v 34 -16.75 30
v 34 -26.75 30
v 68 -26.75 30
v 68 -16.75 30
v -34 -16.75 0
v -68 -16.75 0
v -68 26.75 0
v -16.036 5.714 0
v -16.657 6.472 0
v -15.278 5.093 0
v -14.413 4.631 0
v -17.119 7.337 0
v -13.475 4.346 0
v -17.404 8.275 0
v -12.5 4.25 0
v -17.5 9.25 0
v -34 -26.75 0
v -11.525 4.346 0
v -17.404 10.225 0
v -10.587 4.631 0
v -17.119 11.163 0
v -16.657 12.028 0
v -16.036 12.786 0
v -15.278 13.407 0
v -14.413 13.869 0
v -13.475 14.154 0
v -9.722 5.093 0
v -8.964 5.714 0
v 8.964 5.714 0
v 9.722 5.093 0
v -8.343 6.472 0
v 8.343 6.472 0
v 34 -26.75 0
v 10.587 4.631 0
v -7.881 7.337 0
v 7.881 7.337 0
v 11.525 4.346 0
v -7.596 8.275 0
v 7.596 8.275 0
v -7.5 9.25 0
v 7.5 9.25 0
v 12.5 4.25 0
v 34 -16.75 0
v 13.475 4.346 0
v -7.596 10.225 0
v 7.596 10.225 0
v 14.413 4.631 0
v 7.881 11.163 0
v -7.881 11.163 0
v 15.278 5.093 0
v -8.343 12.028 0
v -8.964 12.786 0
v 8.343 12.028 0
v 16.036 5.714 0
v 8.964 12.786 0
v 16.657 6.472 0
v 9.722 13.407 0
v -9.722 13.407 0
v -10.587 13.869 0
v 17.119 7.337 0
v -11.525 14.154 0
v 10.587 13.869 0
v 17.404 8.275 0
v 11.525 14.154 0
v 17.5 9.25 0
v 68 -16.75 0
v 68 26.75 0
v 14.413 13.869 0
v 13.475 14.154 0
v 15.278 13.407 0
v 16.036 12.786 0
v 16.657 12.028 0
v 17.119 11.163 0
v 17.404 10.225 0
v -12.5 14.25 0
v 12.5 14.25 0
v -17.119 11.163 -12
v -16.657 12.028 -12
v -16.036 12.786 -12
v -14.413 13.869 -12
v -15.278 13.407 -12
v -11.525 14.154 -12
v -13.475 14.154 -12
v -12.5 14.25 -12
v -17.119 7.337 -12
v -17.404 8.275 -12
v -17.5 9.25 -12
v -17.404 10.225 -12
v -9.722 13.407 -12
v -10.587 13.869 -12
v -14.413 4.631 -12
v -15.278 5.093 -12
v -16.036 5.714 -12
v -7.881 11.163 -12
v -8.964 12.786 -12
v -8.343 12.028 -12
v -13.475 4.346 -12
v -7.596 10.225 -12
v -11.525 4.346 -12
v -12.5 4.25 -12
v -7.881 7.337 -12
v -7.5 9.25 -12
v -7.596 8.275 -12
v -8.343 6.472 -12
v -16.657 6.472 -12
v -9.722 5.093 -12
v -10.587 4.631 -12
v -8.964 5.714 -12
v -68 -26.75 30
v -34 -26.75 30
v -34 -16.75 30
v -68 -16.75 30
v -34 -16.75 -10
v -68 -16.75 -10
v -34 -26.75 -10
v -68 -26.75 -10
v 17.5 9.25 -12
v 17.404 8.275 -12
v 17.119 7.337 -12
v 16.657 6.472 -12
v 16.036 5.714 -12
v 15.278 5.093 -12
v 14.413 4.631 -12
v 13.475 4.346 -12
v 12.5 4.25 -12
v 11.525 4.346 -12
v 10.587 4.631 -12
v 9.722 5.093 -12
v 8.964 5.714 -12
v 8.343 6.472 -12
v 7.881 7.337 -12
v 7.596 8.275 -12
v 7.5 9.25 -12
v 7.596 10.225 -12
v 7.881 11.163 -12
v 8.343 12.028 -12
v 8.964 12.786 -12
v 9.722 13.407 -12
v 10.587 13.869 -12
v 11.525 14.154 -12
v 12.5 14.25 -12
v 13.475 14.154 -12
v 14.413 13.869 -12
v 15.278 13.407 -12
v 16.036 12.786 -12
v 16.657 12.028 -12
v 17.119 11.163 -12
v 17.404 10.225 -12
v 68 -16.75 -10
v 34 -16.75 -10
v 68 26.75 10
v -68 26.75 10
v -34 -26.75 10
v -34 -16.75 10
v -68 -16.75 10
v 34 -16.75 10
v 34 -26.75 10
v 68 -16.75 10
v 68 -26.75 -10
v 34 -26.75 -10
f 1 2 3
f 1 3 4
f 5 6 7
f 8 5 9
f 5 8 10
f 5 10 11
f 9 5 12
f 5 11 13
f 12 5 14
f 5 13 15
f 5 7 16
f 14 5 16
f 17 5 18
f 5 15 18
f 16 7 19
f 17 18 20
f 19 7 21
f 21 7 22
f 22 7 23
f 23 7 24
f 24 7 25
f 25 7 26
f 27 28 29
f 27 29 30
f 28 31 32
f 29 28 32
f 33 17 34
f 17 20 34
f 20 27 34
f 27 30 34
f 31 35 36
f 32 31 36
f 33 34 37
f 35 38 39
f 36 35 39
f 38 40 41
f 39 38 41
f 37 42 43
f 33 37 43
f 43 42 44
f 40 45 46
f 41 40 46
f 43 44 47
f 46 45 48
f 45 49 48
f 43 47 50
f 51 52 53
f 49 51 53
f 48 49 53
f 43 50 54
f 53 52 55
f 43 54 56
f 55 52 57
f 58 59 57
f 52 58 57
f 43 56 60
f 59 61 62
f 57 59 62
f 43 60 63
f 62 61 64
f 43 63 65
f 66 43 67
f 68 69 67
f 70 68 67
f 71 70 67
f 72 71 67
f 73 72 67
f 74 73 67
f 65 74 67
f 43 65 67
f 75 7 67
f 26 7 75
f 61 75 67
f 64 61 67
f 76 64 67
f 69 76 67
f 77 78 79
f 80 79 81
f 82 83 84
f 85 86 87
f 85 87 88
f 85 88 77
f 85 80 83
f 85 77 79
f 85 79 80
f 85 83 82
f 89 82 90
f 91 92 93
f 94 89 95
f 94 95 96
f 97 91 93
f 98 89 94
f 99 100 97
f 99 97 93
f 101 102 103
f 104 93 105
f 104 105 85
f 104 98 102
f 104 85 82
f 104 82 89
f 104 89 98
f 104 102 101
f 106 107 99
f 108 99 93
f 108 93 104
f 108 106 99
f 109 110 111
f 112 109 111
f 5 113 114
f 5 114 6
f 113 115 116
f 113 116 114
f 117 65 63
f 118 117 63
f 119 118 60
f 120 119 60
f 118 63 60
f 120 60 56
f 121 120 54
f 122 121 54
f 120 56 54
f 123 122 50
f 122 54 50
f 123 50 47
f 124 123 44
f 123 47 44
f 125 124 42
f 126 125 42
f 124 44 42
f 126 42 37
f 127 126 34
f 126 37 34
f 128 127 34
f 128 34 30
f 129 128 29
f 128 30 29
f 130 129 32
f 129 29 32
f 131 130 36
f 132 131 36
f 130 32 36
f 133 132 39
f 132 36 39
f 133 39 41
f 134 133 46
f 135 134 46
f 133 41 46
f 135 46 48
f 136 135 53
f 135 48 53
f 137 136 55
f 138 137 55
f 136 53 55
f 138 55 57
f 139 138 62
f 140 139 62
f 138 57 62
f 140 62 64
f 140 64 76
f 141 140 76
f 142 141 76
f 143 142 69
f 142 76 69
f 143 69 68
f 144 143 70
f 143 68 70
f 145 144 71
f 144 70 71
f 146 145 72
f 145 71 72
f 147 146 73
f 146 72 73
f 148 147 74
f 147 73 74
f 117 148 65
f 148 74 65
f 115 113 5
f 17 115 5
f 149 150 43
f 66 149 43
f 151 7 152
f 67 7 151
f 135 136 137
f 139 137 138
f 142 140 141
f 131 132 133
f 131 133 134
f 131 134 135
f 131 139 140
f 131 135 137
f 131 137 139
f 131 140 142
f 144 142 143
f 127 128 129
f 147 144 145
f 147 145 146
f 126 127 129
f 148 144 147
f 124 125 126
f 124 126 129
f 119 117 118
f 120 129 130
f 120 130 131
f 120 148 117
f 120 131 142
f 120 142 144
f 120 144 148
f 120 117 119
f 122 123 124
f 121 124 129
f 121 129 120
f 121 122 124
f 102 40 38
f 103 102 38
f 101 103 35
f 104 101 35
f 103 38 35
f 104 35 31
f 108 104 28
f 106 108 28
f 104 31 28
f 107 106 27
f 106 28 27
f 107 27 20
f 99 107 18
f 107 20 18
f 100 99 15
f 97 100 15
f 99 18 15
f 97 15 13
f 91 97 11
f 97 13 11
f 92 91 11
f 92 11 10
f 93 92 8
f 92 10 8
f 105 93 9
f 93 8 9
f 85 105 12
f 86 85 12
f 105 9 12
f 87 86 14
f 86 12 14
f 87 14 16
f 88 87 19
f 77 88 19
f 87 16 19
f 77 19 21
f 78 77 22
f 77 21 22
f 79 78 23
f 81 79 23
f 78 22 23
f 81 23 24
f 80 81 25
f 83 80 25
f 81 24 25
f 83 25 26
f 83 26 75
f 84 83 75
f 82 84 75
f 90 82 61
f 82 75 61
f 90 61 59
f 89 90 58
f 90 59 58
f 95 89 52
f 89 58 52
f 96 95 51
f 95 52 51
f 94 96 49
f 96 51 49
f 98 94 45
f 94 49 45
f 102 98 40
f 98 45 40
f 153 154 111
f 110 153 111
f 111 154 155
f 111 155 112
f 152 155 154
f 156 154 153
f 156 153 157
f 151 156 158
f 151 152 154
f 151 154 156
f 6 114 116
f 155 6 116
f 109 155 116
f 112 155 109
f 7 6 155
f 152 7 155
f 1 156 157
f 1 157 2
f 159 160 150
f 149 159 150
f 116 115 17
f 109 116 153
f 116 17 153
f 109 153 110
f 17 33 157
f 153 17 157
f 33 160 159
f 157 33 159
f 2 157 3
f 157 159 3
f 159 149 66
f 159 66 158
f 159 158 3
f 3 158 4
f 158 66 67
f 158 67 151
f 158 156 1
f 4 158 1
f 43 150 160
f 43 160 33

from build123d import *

# Parameters (mm, degrees)
SKETCH1_W           = 136
SKETCH1_H           = 53.5
BOSS_EXTRUDE1_DEPTH = 10
SKETCH2_R           = 5
BOSS_EXTRUDE2_DEPTH = 12
SKETCH3_W           = 10
SKETCH3_H           = 10
SKETCH3_W_2         = 20
BOSS_EXTRUDE3_DEPTH = 34


with BuildPart() as part:
    # Sketch1 → Boss-Extrude1 (new body)
    with BuildSketch(Plane.XY):
        Rectangle(SKETCH1_W, SKETCH1_H)
    extrude(amount=BOSS_EXTRUDE1_DEPTH)

    # Sketch2 → Boss-Extrude2 (add)
    with BuildSketch(Plane(origin=(0, 0, 0), x_dir=(-1, 0, 0), z_dir=(0, 0, -1))):
        with Locations(Location((12.5, 9.25, 0), (0, 0, 180))):
            Circle(SKETCH2_R)
        with Locations(Location((-12.5, 9.25, 0), (0, 0, 180))):
            Circle(SKETCH2_R)
    extrude(amount=BOSS_EXTRUDE2_DEPTH)

    # Sketch3 → Boss-Extrude3 (add)
    with BuildSketch(Plane.ZY.offset(68)):
        with Locations((-5, -21.75)):
            Rectangle(SKETCH3_W, SKETCH3_H)
        with Locations((20, -21.75)):
            Rectangle(SKETCH3_W_2, SKETCH3_H)
    boss_extrude3 = extrude(amount=-BOSS_EXTRUDE3_DEPTH)

    # Mirror2: Boss-Extrude3 across plane
    add(boss_extrude3.mirror(Plane.ZY))


solid = part.part
